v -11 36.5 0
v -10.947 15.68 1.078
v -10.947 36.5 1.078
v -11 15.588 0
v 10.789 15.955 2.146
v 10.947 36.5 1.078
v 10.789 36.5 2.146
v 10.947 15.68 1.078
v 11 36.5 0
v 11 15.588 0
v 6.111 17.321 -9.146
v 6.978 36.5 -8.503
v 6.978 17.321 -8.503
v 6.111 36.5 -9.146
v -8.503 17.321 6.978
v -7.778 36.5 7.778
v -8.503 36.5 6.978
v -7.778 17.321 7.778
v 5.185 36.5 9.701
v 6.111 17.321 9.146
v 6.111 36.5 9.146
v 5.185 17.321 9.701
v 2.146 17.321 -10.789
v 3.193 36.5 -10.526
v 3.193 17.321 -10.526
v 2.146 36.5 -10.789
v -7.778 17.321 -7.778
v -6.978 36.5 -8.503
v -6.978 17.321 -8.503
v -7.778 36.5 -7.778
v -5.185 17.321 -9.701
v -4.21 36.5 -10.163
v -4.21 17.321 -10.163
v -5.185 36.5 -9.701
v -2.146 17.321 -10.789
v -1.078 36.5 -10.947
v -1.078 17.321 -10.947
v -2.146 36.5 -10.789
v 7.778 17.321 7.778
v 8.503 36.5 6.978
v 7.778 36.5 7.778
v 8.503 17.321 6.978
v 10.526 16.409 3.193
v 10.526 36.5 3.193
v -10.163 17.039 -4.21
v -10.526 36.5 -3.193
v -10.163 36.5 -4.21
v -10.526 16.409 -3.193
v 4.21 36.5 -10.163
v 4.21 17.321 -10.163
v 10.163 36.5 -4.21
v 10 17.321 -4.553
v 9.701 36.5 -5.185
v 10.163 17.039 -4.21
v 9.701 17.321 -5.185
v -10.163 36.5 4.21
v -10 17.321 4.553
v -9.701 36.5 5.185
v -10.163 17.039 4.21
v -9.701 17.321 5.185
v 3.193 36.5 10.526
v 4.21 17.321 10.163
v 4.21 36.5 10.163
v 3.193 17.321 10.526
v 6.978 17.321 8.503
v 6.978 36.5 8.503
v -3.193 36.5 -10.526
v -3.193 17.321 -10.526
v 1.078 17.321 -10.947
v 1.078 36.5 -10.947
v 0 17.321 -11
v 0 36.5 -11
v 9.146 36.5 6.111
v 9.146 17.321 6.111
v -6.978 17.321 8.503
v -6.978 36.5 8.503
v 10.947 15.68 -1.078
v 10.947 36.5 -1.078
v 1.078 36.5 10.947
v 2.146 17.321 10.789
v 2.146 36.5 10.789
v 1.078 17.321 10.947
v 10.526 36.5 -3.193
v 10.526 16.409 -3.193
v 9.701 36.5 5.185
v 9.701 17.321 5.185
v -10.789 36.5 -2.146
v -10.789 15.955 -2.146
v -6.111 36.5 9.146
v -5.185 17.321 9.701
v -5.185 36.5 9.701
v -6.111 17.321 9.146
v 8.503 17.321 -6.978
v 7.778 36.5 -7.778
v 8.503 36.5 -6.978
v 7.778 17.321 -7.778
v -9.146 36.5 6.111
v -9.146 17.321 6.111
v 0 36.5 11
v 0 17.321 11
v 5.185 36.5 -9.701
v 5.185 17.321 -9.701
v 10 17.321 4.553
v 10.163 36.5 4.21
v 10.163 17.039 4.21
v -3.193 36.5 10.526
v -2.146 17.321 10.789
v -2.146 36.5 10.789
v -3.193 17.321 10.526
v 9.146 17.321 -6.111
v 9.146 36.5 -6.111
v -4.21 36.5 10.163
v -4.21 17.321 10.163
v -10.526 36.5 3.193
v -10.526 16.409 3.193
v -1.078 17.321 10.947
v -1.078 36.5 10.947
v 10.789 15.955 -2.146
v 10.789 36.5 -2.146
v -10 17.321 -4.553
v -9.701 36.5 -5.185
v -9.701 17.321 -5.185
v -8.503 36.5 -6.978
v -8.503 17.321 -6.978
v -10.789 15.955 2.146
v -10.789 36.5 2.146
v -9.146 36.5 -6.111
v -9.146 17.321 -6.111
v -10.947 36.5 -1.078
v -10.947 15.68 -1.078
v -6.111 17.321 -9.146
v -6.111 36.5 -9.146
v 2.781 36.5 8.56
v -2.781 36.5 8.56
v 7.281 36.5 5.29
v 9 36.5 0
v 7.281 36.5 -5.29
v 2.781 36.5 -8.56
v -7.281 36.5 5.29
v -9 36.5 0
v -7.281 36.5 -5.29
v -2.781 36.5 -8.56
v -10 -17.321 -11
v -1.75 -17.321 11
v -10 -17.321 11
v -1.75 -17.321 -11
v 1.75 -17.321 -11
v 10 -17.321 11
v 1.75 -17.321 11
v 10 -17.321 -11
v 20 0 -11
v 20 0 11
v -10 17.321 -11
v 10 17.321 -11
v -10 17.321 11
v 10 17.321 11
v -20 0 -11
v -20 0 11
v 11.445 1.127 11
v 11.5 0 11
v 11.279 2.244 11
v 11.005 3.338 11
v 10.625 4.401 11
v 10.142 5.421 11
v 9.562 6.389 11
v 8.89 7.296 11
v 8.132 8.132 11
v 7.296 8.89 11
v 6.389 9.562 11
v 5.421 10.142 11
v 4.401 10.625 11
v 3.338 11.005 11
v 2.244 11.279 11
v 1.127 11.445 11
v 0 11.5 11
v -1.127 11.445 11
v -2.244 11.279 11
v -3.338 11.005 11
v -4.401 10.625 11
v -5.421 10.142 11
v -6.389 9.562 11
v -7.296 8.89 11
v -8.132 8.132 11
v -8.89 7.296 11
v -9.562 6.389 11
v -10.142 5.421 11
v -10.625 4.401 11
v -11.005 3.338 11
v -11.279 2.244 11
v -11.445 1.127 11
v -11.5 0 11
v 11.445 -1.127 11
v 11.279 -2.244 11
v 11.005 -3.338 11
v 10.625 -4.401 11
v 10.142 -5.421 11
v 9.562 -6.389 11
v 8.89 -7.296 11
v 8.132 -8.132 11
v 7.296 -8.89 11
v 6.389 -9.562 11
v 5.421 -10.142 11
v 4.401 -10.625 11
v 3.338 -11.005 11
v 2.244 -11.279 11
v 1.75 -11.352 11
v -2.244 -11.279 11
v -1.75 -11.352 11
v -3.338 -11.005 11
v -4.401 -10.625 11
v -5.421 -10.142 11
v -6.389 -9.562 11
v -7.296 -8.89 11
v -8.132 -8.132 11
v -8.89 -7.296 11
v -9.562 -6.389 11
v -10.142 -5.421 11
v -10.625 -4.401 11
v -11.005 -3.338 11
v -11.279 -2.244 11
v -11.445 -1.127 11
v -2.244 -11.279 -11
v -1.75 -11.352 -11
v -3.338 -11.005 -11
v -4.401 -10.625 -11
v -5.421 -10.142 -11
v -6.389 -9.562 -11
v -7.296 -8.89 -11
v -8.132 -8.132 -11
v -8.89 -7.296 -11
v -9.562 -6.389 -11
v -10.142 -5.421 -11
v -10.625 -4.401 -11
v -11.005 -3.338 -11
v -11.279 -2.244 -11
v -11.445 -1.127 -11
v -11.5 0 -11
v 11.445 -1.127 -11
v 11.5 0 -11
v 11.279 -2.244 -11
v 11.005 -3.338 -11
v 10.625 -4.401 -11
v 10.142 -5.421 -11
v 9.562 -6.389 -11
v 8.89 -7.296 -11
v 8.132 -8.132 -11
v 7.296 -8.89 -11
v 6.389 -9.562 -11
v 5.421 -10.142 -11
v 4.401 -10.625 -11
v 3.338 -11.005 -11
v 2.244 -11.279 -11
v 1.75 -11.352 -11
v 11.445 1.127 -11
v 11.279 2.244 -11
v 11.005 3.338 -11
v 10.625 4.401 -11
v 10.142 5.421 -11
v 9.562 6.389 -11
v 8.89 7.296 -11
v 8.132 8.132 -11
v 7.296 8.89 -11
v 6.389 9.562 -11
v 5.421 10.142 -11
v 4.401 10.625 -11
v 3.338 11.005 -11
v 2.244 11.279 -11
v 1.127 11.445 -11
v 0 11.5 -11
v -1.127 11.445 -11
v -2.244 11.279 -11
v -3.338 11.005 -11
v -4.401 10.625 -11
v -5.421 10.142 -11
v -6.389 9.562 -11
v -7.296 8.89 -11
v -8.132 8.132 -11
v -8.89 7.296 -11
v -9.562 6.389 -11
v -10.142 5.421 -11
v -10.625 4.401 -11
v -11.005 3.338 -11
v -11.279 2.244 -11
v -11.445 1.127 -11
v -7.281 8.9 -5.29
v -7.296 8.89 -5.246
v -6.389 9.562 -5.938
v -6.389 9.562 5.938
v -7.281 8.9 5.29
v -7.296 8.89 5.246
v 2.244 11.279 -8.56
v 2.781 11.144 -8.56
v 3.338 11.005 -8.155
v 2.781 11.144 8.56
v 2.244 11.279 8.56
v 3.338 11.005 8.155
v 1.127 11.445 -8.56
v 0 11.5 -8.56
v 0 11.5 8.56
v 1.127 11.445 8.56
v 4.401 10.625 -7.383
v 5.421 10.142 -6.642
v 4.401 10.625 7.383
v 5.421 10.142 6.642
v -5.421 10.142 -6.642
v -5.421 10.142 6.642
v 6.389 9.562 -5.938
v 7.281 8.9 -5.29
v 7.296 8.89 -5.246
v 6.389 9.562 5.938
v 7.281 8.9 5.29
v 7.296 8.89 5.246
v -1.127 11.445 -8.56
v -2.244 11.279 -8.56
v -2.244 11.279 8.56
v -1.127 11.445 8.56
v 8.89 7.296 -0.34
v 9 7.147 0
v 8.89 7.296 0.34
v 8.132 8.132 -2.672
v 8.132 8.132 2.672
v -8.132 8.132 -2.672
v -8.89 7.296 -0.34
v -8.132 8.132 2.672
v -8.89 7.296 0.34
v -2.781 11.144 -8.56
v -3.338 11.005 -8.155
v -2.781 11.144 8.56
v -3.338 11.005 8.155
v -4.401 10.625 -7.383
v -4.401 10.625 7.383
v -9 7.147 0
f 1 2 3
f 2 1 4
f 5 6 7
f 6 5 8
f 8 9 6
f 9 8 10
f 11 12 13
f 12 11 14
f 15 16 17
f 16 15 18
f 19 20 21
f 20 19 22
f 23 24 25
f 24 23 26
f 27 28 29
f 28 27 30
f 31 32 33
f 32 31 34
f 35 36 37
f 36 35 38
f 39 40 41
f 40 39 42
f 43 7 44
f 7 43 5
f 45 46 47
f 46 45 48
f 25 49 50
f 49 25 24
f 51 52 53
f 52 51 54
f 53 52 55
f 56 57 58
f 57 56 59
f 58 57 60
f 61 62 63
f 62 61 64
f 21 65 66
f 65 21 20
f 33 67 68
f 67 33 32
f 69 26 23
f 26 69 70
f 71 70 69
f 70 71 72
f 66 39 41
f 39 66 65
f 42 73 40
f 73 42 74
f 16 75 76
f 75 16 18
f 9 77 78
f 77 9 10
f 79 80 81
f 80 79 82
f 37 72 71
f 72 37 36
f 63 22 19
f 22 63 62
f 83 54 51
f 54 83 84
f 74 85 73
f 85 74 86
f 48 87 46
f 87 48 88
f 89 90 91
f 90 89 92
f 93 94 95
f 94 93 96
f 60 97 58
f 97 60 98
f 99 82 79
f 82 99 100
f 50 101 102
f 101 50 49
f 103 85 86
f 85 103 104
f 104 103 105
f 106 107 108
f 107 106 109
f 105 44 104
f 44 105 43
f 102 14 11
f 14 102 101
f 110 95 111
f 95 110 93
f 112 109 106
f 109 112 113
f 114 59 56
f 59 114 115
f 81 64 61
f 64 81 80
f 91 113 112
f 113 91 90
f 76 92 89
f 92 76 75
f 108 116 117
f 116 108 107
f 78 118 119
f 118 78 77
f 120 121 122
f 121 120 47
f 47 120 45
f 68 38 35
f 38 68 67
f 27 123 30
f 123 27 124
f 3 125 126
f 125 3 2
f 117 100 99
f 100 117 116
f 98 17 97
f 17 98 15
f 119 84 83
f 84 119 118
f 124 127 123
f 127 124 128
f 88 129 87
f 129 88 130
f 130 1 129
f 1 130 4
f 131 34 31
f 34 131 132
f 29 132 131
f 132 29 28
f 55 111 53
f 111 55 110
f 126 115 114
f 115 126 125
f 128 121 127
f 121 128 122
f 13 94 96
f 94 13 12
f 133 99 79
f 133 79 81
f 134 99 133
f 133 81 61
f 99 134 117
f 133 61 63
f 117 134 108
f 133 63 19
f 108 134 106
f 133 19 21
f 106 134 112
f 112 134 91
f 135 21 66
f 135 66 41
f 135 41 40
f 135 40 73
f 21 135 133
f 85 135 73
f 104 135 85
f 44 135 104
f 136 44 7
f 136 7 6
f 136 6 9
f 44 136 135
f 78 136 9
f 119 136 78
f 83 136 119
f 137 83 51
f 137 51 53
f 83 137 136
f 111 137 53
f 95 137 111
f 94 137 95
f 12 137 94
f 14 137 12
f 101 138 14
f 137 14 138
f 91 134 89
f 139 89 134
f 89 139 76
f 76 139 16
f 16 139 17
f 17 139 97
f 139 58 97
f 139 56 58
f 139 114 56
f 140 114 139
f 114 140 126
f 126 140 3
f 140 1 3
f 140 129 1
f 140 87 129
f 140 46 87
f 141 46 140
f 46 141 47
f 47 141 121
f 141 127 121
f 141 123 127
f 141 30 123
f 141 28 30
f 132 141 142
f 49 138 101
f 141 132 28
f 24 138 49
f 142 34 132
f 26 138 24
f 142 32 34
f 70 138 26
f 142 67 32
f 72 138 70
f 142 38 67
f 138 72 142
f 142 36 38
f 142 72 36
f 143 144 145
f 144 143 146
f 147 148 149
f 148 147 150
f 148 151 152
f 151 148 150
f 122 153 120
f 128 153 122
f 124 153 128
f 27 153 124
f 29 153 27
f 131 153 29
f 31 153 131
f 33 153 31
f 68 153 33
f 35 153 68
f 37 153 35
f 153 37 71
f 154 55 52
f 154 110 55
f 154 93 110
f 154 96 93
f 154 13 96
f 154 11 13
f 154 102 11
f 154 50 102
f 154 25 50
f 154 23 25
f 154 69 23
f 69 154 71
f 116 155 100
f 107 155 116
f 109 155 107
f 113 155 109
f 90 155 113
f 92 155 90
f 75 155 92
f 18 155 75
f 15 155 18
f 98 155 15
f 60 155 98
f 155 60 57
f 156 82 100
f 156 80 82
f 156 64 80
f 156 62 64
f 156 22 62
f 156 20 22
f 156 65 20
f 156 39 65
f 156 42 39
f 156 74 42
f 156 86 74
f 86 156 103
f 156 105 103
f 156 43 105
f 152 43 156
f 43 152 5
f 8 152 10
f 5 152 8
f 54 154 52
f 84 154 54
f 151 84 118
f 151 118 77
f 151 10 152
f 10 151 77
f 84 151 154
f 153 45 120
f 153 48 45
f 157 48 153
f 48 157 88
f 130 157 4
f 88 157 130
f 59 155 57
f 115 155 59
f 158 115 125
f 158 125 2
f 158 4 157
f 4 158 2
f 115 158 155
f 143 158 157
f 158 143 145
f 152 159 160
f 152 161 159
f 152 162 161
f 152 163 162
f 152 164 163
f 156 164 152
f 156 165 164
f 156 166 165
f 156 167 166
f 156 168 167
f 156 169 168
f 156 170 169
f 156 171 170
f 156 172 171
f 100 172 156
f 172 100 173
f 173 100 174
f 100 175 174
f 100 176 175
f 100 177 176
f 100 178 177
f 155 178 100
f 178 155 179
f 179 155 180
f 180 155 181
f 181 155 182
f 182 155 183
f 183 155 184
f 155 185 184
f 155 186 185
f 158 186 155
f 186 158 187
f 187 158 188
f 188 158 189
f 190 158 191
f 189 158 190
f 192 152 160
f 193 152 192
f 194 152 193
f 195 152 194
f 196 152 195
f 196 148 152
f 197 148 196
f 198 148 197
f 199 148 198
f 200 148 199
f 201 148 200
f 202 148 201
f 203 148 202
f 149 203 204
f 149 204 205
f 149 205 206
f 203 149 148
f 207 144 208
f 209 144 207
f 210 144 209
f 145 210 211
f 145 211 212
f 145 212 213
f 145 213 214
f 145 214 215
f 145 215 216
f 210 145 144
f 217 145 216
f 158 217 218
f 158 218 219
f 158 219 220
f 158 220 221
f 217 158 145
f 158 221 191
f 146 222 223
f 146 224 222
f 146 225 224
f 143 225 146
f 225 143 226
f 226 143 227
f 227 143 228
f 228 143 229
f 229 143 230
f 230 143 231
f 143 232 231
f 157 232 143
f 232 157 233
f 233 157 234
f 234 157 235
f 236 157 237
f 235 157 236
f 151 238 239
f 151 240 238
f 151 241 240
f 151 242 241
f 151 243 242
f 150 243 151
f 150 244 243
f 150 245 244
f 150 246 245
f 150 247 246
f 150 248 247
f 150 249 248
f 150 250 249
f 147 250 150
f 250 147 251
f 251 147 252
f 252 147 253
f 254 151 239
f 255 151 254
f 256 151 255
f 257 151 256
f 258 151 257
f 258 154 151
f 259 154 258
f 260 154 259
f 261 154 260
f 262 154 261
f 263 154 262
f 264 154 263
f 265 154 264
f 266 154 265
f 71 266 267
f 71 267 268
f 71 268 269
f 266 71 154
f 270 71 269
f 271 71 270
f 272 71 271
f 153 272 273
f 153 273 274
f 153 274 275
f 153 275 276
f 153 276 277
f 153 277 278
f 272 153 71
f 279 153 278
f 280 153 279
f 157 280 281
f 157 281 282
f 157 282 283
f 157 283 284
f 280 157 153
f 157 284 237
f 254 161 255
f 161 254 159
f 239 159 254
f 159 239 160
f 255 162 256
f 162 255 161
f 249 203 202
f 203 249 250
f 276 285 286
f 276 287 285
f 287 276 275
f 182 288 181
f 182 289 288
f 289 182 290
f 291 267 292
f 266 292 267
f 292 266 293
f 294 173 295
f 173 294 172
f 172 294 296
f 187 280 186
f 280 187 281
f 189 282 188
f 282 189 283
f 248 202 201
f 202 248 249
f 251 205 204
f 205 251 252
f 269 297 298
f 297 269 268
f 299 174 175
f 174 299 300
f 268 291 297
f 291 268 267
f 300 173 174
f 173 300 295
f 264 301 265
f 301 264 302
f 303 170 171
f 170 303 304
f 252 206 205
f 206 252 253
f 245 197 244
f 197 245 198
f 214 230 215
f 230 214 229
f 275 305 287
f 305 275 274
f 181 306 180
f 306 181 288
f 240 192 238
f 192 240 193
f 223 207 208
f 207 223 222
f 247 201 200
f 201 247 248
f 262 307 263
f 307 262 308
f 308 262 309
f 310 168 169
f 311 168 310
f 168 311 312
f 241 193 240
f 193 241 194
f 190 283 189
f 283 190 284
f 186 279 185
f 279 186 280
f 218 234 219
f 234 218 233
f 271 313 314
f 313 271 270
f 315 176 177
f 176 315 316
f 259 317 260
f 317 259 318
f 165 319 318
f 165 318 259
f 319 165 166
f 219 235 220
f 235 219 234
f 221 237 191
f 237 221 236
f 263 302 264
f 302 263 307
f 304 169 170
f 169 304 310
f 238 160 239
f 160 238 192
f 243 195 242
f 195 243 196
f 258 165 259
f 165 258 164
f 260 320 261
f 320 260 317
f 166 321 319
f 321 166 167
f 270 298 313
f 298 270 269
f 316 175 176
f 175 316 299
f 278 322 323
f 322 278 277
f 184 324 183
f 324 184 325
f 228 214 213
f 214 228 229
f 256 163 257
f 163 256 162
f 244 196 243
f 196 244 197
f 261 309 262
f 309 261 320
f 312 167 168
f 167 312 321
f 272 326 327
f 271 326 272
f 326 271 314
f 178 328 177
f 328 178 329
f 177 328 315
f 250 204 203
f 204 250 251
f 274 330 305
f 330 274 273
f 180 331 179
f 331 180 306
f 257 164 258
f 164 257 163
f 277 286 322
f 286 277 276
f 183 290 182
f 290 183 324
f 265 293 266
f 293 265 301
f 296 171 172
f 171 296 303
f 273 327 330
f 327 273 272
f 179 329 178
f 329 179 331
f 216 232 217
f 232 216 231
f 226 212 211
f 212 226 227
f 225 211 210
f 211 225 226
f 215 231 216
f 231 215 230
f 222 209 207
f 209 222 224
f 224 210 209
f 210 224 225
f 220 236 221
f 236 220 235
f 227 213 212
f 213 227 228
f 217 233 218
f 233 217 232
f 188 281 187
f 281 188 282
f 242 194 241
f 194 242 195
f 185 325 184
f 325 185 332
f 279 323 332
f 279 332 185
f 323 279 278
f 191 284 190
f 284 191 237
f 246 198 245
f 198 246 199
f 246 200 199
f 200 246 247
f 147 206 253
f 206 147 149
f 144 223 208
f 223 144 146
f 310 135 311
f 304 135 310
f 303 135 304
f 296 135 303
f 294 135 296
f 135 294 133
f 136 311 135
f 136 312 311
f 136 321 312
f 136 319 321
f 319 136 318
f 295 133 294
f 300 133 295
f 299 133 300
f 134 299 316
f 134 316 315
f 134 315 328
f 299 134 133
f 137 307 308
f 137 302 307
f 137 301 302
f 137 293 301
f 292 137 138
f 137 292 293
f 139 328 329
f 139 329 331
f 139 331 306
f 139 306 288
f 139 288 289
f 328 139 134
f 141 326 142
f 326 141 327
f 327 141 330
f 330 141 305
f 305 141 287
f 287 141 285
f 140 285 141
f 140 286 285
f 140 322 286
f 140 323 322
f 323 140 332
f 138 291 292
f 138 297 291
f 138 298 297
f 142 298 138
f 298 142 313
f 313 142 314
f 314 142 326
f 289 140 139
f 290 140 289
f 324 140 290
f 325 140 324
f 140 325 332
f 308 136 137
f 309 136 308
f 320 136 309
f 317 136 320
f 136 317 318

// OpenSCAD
$fn = 64;

tub_diameter = 22;
tub_length = 25;
tub_wall_thickness = 4;
sensor_diameter = 23;
wire_diameter = 3.5;
// calculated
housing_diameter = 40;

opened = true;

difference() {
    union() {
        translate([0, tub_length-2, 0]) rotate([90,0,0]) 
            cylinder(h = tub_length+2, d = tub_diameter, center = true);
        cylinder(h = tub_diameter, d = housing_diameter, center = true, $fn=6);
    }
    // hollow
    translate([0, (tub_length + tub_diameter)/2, 0]) rotate([90,0,0]) 
        cylinder(h = tub_length + tub_diameter, d = tub_diameter - tub_wall_thickness, center = true, $fn=10);

    if(opened){
        // sensor
        cylinder(h = tub_diameter*1.1, d = sensor_diameter, center = true);
        // slit
        translate([0, -housing_diameter/2, 0]) 
            cube([wire_diameter, housing_diameter, tub_diameter*1.1], center=true);
    }else{
        // sensor
        translate([0, 0, -tub_diameter/2-1]) 
            cylinder(h = tub_diameter, d = sensor_diameter);
    }
}
